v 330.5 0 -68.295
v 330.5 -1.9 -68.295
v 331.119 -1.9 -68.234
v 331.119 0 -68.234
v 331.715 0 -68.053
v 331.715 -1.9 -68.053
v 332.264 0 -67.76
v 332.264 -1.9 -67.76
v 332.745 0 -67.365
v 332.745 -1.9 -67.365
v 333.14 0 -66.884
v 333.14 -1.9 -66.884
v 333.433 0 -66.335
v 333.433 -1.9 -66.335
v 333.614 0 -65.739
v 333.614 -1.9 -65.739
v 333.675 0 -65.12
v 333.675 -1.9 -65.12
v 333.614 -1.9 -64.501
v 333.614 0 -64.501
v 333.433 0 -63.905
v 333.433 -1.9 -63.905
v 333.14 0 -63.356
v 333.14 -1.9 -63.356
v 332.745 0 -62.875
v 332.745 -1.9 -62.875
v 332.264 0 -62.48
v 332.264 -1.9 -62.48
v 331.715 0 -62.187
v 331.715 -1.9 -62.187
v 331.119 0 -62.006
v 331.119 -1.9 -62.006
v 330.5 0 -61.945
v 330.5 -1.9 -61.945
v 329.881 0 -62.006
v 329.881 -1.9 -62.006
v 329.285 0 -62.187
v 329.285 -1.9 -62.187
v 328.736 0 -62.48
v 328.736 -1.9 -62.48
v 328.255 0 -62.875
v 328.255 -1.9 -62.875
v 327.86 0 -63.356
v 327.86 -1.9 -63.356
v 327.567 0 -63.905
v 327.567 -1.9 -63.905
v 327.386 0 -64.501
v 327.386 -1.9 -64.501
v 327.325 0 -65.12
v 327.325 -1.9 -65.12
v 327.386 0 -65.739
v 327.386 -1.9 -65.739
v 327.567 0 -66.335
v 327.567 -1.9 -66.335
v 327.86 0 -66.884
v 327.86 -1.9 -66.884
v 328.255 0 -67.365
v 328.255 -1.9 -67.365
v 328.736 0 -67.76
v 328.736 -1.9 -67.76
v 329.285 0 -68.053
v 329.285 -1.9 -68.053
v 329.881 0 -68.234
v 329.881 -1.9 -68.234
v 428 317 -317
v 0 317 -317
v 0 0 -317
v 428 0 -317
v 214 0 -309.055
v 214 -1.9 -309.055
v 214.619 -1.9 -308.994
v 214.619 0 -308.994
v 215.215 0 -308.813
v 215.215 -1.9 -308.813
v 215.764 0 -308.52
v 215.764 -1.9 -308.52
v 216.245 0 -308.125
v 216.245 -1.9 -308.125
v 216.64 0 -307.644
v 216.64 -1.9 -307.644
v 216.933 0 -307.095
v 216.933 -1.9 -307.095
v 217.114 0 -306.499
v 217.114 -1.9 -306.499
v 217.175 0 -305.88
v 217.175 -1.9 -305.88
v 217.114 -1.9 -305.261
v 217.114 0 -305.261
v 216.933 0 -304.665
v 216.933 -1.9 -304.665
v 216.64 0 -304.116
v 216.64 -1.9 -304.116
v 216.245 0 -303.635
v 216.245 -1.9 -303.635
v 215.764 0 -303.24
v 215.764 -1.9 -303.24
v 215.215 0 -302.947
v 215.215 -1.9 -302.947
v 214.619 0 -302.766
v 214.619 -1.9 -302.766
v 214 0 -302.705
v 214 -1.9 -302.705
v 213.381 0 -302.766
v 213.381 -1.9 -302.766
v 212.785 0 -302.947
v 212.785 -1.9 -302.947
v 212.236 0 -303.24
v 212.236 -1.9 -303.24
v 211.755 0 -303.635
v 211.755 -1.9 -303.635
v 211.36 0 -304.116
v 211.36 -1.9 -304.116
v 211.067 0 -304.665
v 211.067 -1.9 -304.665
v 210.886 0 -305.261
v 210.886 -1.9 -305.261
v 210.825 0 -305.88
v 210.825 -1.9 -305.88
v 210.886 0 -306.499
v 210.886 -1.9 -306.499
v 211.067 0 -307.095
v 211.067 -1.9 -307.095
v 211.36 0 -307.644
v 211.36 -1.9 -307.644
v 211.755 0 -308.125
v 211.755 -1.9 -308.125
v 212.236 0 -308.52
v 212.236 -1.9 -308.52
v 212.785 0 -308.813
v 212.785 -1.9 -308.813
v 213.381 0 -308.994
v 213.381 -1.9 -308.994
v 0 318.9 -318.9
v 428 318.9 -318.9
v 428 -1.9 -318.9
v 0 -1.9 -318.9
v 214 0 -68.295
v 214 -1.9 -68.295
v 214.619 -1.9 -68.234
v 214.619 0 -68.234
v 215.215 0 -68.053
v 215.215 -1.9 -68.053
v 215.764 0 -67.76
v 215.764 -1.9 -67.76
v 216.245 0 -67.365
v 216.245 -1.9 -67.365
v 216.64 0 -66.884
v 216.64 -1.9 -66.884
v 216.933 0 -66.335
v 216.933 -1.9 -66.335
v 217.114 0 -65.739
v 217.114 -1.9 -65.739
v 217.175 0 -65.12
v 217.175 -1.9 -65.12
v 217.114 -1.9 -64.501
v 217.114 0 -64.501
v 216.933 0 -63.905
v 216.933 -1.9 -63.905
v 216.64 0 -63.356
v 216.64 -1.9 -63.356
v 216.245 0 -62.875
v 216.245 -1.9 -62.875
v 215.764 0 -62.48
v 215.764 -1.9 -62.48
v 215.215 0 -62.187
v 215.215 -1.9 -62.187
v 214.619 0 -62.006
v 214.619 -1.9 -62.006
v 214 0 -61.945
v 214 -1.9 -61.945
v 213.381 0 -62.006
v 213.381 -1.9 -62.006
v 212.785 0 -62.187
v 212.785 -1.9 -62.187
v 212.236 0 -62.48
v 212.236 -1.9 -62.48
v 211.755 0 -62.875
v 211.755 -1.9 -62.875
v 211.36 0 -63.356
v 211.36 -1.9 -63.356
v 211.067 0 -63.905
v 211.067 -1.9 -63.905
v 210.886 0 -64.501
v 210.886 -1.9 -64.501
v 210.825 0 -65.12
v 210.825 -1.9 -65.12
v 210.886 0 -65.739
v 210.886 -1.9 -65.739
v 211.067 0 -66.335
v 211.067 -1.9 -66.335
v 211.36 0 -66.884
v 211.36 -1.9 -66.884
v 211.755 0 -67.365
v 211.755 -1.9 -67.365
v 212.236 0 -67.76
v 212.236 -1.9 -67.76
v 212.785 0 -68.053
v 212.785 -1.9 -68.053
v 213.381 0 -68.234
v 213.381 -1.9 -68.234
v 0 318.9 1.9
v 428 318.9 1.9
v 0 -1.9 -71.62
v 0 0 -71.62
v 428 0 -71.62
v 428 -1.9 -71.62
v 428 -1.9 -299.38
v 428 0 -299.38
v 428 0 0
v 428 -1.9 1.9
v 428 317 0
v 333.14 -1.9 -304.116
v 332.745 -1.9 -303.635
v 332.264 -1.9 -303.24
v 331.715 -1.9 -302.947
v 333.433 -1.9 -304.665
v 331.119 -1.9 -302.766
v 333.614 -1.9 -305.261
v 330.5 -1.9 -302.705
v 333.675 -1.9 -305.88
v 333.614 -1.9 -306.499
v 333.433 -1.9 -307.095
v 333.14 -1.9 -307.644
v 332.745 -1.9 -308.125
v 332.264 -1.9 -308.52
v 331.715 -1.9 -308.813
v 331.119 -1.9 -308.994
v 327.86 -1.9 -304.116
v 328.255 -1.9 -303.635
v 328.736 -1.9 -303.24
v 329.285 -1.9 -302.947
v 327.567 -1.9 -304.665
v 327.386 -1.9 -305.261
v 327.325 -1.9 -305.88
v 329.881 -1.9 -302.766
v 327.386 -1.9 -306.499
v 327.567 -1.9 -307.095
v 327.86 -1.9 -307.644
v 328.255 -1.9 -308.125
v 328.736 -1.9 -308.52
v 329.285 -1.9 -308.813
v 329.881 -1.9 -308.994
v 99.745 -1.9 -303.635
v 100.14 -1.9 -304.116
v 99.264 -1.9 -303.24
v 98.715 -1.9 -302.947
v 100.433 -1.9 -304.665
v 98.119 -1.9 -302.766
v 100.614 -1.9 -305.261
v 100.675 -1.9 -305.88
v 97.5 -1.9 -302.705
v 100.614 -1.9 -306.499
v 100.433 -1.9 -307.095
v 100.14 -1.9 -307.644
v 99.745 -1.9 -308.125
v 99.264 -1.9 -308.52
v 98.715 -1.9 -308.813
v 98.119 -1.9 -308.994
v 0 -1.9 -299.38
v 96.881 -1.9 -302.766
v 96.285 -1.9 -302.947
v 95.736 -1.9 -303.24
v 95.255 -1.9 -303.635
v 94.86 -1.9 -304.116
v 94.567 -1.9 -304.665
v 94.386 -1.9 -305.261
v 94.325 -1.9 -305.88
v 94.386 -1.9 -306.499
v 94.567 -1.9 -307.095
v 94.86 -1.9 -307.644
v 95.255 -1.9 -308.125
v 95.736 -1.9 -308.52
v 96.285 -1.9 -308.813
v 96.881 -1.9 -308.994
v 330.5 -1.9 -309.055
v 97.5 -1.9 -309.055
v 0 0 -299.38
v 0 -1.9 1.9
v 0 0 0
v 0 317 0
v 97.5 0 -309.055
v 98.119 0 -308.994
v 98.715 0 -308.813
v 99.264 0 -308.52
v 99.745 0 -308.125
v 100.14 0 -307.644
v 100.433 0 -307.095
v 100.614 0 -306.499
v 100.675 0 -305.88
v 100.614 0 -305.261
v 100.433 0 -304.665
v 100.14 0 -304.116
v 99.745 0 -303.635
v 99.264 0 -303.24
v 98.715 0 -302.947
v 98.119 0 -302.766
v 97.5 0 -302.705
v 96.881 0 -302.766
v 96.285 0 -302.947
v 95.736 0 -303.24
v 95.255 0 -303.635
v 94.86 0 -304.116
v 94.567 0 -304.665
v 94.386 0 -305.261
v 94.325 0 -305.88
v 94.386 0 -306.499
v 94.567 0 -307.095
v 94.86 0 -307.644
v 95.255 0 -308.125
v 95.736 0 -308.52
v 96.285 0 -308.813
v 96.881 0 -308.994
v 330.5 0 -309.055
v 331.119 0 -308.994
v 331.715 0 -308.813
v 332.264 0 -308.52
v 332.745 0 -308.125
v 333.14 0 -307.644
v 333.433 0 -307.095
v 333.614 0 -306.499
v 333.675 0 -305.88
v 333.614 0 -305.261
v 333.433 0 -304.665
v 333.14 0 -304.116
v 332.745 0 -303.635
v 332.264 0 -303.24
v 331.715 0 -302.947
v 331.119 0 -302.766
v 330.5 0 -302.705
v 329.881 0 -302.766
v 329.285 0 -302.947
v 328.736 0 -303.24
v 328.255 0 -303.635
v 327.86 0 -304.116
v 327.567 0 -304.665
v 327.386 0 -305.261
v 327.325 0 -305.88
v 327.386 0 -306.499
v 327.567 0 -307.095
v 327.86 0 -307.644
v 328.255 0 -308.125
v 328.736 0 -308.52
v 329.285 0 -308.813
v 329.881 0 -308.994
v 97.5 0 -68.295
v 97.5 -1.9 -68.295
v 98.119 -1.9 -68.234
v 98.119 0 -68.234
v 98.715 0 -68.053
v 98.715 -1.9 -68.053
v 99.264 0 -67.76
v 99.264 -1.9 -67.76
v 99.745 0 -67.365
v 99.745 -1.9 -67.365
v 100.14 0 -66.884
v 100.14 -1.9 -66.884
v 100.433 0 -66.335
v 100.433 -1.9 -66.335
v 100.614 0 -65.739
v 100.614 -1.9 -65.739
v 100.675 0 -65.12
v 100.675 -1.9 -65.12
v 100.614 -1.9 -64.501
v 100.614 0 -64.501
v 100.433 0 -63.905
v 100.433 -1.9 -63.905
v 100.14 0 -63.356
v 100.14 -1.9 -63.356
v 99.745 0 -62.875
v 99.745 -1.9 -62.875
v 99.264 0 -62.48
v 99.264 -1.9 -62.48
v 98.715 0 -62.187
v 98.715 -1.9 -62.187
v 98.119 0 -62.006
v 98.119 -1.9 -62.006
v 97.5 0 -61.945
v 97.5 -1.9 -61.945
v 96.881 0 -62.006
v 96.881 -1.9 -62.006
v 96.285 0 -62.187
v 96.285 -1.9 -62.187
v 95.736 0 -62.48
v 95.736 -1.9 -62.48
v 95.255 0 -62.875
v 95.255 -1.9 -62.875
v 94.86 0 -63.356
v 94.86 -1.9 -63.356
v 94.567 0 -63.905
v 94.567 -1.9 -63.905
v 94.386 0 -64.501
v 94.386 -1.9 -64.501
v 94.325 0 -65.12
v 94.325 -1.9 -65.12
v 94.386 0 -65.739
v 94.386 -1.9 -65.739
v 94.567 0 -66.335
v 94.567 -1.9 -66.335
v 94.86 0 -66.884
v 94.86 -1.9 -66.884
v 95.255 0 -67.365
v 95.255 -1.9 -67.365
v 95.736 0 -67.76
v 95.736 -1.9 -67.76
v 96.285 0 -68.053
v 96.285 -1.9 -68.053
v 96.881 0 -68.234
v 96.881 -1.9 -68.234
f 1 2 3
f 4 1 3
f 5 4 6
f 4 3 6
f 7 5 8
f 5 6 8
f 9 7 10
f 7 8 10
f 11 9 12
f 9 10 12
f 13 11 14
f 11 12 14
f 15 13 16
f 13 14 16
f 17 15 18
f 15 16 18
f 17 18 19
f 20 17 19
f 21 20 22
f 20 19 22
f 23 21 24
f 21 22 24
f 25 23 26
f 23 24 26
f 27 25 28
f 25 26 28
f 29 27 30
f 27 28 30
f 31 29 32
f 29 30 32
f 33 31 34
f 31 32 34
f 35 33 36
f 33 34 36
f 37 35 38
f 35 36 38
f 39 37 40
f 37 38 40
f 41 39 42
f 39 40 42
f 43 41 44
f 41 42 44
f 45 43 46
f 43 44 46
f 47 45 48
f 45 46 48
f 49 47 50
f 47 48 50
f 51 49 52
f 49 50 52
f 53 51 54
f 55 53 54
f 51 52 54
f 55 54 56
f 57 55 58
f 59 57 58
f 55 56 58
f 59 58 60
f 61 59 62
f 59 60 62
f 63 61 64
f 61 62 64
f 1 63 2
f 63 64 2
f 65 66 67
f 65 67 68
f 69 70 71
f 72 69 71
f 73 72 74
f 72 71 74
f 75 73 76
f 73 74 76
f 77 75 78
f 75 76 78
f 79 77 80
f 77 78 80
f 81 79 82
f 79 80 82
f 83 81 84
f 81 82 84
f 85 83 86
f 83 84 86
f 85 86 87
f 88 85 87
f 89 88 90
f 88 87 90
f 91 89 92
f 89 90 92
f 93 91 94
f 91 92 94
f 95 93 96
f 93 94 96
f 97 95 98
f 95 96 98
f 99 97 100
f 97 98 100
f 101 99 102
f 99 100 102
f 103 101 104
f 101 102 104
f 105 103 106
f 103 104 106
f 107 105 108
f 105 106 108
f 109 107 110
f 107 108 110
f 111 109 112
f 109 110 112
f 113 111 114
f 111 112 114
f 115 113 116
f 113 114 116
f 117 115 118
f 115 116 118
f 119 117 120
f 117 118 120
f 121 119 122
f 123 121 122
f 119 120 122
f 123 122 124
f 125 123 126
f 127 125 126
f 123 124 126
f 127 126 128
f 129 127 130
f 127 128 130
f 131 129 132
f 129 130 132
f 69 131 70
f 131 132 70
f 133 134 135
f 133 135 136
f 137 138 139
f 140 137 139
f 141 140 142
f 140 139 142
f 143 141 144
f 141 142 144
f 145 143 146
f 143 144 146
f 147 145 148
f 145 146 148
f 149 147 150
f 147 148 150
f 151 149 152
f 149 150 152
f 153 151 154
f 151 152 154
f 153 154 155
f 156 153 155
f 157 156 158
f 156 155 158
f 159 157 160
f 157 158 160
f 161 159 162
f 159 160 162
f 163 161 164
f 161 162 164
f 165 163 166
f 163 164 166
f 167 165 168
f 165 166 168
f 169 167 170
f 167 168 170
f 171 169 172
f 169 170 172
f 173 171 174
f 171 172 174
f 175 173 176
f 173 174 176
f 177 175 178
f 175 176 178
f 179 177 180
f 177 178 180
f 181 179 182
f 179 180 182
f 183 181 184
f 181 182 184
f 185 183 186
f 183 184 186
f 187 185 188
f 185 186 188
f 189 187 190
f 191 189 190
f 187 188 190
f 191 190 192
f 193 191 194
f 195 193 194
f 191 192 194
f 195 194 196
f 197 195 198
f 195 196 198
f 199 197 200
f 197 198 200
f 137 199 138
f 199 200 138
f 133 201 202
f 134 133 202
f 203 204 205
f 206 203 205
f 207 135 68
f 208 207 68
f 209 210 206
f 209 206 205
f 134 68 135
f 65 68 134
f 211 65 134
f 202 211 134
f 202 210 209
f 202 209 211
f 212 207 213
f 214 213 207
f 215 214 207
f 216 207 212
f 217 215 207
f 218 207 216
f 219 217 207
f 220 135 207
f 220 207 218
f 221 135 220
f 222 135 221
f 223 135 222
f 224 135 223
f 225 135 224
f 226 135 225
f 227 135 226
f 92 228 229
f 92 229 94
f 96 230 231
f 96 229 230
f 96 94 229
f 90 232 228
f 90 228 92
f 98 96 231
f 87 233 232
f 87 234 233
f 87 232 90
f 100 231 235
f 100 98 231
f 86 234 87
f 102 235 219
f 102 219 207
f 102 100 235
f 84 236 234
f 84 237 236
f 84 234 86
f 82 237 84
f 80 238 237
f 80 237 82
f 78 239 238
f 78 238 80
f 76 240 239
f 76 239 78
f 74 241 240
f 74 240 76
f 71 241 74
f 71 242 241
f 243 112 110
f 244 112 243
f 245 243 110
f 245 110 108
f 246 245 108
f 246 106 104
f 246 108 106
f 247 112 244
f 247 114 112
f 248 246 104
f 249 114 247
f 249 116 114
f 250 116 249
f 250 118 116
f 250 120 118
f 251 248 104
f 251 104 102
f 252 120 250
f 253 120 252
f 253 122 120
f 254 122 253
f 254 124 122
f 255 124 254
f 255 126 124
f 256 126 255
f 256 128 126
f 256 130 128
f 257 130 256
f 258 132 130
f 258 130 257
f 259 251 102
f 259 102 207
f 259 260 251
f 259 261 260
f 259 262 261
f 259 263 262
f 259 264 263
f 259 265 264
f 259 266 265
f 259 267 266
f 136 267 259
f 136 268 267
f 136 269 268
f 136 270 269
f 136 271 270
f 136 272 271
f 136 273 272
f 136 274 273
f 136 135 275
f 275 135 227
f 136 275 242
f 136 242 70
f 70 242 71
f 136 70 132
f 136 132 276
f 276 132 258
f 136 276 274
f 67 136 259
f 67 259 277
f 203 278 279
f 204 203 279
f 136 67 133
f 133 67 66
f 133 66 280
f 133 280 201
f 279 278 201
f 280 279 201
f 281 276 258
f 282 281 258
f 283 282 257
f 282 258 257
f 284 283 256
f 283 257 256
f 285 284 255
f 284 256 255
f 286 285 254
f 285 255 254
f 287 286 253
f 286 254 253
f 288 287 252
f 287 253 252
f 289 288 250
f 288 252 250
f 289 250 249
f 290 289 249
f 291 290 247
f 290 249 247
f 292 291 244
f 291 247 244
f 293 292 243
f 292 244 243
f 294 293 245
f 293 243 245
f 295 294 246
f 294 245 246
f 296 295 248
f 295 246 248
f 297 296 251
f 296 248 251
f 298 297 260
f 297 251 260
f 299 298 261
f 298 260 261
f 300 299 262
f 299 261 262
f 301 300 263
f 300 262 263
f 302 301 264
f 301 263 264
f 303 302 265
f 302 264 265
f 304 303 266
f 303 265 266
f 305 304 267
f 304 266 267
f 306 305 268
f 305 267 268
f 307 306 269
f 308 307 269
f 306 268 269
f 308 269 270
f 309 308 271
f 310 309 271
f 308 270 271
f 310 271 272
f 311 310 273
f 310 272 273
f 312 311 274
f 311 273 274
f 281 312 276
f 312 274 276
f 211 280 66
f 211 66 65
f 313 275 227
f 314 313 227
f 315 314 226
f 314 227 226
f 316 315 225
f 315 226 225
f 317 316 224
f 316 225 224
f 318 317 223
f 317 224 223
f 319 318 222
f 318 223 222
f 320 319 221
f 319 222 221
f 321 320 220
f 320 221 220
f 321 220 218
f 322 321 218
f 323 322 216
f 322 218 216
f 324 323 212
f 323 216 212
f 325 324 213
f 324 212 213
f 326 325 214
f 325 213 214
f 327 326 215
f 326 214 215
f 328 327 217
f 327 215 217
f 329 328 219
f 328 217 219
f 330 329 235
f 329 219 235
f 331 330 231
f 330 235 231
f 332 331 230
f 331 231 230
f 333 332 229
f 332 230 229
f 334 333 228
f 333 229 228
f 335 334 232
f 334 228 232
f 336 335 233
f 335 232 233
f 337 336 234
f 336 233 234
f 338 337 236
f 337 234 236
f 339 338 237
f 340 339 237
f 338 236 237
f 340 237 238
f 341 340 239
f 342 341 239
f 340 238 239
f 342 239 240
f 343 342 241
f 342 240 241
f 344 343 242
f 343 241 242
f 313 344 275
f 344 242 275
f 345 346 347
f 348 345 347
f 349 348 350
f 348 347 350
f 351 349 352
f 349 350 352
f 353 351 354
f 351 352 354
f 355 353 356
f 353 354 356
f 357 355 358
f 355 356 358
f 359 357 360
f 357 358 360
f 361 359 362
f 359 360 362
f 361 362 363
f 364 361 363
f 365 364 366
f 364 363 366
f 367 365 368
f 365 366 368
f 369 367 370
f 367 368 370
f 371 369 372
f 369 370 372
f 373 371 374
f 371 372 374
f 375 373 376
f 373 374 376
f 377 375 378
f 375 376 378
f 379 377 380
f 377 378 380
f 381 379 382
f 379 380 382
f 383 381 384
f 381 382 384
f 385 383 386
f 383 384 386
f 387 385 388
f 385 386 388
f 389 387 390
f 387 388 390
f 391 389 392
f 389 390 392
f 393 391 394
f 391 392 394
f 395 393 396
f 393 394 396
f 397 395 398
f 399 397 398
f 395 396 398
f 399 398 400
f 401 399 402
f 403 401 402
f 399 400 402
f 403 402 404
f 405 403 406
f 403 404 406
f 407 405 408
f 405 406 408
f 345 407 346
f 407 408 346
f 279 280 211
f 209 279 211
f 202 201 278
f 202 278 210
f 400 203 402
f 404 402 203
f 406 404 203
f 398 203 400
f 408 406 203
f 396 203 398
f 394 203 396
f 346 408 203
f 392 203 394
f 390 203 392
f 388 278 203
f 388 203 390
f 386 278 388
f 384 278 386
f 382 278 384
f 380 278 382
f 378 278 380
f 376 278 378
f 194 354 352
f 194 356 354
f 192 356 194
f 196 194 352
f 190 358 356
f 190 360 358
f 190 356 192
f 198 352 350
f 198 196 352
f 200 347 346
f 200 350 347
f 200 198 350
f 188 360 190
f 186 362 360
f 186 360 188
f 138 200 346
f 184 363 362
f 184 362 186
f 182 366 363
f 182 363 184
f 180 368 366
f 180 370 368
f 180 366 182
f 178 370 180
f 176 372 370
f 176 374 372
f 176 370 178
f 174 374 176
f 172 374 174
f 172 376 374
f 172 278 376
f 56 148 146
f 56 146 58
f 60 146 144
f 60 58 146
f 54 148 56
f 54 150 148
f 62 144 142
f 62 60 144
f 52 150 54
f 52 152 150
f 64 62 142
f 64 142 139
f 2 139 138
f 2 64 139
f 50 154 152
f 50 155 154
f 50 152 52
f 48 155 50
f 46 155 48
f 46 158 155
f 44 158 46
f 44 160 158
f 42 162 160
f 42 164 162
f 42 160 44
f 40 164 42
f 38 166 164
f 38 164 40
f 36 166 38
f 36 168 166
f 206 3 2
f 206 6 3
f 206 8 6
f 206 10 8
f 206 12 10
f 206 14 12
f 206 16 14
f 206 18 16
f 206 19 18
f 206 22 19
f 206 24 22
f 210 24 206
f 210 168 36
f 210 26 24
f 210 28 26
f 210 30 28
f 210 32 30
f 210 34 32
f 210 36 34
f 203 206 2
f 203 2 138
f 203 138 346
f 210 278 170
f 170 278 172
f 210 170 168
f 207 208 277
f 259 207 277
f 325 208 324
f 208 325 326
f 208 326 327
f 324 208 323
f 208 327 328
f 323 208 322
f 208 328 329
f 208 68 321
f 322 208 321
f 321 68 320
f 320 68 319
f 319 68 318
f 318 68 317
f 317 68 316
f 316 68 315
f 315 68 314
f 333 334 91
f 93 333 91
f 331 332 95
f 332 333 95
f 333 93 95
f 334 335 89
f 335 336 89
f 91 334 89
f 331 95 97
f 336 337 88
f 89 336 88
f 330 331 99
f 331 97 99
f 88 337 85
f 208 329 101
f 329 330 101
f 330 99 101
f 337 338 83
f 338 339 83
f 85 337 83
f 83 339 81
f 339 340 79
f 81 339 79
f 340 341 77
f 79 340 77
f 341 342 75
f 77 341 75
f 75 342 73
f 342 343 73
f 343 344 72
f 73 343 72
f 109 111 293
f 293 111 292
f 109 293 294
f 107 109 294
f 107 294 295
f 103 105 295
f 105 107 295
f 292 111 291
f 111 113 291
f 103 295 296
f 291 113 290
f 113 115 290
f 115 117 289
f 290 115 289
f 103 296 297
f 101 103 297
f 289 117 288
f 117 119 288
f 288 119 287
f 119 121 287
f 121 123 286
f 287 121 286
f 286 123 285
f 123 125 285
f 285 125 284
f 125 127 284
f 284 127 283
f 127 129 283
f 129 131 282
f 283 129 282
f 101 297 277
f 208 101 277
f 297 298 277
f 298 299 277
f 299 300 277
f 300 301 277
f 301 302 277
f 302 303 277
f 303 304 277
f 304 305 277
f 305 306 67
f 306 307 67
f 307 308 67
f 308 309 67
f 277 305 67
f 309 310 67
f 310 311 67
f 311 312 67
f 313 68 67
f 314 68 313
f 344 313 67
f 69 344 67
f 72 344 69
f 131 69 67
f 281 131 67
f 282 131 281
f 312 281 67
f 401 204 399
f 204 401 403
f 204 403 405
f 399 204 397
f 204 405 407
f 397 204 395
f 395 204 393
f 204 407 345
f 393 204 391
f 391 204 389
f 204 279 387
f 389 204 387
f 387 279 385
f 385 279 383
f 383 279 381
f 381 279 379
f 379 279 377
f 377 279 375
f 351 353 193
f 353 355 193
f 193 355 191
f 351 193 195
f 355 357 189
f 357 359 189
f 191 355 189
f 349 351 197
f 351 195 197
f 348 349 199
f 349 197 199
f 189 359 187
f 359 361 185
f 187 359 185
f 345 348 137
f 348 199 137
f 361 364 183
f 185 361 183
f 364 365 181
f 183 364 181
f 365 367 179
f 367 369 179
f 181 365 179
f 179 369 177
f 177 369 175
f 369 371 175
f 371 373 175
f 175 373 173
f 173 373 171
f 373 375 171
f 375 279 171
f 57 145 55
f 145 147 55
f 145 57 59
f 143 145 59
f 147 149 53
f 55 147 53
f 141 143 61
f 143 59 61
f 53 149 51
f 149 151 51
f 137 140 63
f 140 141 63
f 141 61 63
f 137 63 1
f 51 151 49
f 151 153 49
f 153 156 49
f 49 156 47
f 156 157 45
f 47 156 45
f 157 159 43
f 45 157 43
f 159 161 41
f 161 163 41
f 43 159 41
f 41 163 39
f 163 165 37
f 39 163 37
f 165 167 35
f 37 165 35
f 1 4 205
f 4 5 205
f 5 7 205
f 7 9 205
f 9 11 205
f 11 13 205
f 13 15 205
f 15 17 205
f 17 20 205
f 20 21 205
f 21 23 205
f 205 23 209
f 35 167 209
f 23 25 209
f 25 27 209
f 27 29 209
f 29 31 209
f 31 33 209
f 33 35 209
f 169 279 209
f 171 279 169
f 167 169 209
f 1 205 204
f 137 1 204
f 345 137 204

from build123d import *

# Parameters (mm, degrees)
CROQUIS1_W              = 428
CROQUIS1_H              = 317
SALIENTE_EXTRUIR1_DEPTH = 1.9
CROQUIS3_W              = 428
CROQUIS3_H              = 1.9
SALIENTE_EXTRUIR2_DEPTH = 320.8
CROQUIS4_W              = 428
CROQUIS4_H              = 1.9
SALIENTE_EXTRUIR3_DEPTH = 317
CROQUIS6_W              = 428
CROQUIS6_H              = 1.9
SALIENTE_EXTRUIR4_DEPTH = 19.52
CROQUIS7_W              = 428
CROQUIS7_H              = 1.9
SALIENTE_EXTRUIR5_DEPTH = 73.52
CROQUIS8_R              = 3.175
CORTAR_EXTRUIR1_DEPTH   = 1.9


with BuildPart() as part:
    # Croquis1 → Saliente-Extruir1 (new body)
    with BuildSketch(Plane.XY):
        with Locations((214, 158.5)):
            Rectangle(CROQUIS1_W, CROQUIS1_H)
    extrude(amount=SALIENTE_EXTRUIR1_DEPTH)

    # Croquis3 → Saliente-Extruir2 (add)
    with BuildSketch(Plane.XY.offset(1.9)):
        with Locations((214, 317.95)):
            Rectangle(CROQUIS3_W, CROQUIS3_H)
    extrude(amount=-SALIENTE_EXTRUIR2_DEPTH)

    # Croquis4 → Saliente-Extruir3 (add)
    with BuildSketch(Plane.XZ.offset(-317)):
        with Locations((214, -317.95)):
            Rectangle(CROQUIS4_W, CROQUIS4_H)
    extrude(amount=SALIENTE_EXTRUIR3_DEPTH)

    # Croquis6 → Saliente-Extruir4 (add)
    with BuildSketch(Plane(origin=(0, 0, -318.9), x_dir=(-1, 0, 0), z_dir=(0, 0, -1))):
        with Locations((-214, -0.95)):
            Rectangle(CROQUIS6_W, CROQUIS6_H)
    extrude(amount=-SALIENTE_EXTRUIR4_DEPTH)

    # Croquis7 → Saliente-Extruir5 (add)
    with BuildSketch(Plane.XY.offset(1.9)):
        with Locations((214, -0.95)):
            Rectangle(CROQUIS7_W, CROQUIS7_H)
    extrude(amount=-SALIENTE_EXTRUIR5_DEPTH)

    # Croquis8 → Cortar-Extruir1 (cut)
    with BuildSketch(Plane.XZ.offset(1.9)):
        with Locations(Location((214, -305.88, 0), (0, 0, 270))):
            Circle(CROQUIS8_R)
        with Locations(Location((330.5, -305.88, 0), (0, 0, 270))):
            Circle(CROQUIS8_R)
        with Locations(Location((97.5, -305.88, 0), (0, 0, 270))):
            Circle(CROQUIS8_R)
        with Locations(Location((97.5, -65.12, 0), (0, 0, 270))):
            Circle(CROQUIS8_R)
        with Locations(Location((330.5, -65.12, 0), (0, 0, 270))):
            Circle(CROQUIS8_R)
        with Locations(Location((214, -65.12, 0), (0, 0, 270))):
            Circle(CROQUIS8_R)
    extrude(amount=-CORTAR_EXTRUIR1_DEPTH, mode=Mode.SUBTRACT)


solid = part.part
